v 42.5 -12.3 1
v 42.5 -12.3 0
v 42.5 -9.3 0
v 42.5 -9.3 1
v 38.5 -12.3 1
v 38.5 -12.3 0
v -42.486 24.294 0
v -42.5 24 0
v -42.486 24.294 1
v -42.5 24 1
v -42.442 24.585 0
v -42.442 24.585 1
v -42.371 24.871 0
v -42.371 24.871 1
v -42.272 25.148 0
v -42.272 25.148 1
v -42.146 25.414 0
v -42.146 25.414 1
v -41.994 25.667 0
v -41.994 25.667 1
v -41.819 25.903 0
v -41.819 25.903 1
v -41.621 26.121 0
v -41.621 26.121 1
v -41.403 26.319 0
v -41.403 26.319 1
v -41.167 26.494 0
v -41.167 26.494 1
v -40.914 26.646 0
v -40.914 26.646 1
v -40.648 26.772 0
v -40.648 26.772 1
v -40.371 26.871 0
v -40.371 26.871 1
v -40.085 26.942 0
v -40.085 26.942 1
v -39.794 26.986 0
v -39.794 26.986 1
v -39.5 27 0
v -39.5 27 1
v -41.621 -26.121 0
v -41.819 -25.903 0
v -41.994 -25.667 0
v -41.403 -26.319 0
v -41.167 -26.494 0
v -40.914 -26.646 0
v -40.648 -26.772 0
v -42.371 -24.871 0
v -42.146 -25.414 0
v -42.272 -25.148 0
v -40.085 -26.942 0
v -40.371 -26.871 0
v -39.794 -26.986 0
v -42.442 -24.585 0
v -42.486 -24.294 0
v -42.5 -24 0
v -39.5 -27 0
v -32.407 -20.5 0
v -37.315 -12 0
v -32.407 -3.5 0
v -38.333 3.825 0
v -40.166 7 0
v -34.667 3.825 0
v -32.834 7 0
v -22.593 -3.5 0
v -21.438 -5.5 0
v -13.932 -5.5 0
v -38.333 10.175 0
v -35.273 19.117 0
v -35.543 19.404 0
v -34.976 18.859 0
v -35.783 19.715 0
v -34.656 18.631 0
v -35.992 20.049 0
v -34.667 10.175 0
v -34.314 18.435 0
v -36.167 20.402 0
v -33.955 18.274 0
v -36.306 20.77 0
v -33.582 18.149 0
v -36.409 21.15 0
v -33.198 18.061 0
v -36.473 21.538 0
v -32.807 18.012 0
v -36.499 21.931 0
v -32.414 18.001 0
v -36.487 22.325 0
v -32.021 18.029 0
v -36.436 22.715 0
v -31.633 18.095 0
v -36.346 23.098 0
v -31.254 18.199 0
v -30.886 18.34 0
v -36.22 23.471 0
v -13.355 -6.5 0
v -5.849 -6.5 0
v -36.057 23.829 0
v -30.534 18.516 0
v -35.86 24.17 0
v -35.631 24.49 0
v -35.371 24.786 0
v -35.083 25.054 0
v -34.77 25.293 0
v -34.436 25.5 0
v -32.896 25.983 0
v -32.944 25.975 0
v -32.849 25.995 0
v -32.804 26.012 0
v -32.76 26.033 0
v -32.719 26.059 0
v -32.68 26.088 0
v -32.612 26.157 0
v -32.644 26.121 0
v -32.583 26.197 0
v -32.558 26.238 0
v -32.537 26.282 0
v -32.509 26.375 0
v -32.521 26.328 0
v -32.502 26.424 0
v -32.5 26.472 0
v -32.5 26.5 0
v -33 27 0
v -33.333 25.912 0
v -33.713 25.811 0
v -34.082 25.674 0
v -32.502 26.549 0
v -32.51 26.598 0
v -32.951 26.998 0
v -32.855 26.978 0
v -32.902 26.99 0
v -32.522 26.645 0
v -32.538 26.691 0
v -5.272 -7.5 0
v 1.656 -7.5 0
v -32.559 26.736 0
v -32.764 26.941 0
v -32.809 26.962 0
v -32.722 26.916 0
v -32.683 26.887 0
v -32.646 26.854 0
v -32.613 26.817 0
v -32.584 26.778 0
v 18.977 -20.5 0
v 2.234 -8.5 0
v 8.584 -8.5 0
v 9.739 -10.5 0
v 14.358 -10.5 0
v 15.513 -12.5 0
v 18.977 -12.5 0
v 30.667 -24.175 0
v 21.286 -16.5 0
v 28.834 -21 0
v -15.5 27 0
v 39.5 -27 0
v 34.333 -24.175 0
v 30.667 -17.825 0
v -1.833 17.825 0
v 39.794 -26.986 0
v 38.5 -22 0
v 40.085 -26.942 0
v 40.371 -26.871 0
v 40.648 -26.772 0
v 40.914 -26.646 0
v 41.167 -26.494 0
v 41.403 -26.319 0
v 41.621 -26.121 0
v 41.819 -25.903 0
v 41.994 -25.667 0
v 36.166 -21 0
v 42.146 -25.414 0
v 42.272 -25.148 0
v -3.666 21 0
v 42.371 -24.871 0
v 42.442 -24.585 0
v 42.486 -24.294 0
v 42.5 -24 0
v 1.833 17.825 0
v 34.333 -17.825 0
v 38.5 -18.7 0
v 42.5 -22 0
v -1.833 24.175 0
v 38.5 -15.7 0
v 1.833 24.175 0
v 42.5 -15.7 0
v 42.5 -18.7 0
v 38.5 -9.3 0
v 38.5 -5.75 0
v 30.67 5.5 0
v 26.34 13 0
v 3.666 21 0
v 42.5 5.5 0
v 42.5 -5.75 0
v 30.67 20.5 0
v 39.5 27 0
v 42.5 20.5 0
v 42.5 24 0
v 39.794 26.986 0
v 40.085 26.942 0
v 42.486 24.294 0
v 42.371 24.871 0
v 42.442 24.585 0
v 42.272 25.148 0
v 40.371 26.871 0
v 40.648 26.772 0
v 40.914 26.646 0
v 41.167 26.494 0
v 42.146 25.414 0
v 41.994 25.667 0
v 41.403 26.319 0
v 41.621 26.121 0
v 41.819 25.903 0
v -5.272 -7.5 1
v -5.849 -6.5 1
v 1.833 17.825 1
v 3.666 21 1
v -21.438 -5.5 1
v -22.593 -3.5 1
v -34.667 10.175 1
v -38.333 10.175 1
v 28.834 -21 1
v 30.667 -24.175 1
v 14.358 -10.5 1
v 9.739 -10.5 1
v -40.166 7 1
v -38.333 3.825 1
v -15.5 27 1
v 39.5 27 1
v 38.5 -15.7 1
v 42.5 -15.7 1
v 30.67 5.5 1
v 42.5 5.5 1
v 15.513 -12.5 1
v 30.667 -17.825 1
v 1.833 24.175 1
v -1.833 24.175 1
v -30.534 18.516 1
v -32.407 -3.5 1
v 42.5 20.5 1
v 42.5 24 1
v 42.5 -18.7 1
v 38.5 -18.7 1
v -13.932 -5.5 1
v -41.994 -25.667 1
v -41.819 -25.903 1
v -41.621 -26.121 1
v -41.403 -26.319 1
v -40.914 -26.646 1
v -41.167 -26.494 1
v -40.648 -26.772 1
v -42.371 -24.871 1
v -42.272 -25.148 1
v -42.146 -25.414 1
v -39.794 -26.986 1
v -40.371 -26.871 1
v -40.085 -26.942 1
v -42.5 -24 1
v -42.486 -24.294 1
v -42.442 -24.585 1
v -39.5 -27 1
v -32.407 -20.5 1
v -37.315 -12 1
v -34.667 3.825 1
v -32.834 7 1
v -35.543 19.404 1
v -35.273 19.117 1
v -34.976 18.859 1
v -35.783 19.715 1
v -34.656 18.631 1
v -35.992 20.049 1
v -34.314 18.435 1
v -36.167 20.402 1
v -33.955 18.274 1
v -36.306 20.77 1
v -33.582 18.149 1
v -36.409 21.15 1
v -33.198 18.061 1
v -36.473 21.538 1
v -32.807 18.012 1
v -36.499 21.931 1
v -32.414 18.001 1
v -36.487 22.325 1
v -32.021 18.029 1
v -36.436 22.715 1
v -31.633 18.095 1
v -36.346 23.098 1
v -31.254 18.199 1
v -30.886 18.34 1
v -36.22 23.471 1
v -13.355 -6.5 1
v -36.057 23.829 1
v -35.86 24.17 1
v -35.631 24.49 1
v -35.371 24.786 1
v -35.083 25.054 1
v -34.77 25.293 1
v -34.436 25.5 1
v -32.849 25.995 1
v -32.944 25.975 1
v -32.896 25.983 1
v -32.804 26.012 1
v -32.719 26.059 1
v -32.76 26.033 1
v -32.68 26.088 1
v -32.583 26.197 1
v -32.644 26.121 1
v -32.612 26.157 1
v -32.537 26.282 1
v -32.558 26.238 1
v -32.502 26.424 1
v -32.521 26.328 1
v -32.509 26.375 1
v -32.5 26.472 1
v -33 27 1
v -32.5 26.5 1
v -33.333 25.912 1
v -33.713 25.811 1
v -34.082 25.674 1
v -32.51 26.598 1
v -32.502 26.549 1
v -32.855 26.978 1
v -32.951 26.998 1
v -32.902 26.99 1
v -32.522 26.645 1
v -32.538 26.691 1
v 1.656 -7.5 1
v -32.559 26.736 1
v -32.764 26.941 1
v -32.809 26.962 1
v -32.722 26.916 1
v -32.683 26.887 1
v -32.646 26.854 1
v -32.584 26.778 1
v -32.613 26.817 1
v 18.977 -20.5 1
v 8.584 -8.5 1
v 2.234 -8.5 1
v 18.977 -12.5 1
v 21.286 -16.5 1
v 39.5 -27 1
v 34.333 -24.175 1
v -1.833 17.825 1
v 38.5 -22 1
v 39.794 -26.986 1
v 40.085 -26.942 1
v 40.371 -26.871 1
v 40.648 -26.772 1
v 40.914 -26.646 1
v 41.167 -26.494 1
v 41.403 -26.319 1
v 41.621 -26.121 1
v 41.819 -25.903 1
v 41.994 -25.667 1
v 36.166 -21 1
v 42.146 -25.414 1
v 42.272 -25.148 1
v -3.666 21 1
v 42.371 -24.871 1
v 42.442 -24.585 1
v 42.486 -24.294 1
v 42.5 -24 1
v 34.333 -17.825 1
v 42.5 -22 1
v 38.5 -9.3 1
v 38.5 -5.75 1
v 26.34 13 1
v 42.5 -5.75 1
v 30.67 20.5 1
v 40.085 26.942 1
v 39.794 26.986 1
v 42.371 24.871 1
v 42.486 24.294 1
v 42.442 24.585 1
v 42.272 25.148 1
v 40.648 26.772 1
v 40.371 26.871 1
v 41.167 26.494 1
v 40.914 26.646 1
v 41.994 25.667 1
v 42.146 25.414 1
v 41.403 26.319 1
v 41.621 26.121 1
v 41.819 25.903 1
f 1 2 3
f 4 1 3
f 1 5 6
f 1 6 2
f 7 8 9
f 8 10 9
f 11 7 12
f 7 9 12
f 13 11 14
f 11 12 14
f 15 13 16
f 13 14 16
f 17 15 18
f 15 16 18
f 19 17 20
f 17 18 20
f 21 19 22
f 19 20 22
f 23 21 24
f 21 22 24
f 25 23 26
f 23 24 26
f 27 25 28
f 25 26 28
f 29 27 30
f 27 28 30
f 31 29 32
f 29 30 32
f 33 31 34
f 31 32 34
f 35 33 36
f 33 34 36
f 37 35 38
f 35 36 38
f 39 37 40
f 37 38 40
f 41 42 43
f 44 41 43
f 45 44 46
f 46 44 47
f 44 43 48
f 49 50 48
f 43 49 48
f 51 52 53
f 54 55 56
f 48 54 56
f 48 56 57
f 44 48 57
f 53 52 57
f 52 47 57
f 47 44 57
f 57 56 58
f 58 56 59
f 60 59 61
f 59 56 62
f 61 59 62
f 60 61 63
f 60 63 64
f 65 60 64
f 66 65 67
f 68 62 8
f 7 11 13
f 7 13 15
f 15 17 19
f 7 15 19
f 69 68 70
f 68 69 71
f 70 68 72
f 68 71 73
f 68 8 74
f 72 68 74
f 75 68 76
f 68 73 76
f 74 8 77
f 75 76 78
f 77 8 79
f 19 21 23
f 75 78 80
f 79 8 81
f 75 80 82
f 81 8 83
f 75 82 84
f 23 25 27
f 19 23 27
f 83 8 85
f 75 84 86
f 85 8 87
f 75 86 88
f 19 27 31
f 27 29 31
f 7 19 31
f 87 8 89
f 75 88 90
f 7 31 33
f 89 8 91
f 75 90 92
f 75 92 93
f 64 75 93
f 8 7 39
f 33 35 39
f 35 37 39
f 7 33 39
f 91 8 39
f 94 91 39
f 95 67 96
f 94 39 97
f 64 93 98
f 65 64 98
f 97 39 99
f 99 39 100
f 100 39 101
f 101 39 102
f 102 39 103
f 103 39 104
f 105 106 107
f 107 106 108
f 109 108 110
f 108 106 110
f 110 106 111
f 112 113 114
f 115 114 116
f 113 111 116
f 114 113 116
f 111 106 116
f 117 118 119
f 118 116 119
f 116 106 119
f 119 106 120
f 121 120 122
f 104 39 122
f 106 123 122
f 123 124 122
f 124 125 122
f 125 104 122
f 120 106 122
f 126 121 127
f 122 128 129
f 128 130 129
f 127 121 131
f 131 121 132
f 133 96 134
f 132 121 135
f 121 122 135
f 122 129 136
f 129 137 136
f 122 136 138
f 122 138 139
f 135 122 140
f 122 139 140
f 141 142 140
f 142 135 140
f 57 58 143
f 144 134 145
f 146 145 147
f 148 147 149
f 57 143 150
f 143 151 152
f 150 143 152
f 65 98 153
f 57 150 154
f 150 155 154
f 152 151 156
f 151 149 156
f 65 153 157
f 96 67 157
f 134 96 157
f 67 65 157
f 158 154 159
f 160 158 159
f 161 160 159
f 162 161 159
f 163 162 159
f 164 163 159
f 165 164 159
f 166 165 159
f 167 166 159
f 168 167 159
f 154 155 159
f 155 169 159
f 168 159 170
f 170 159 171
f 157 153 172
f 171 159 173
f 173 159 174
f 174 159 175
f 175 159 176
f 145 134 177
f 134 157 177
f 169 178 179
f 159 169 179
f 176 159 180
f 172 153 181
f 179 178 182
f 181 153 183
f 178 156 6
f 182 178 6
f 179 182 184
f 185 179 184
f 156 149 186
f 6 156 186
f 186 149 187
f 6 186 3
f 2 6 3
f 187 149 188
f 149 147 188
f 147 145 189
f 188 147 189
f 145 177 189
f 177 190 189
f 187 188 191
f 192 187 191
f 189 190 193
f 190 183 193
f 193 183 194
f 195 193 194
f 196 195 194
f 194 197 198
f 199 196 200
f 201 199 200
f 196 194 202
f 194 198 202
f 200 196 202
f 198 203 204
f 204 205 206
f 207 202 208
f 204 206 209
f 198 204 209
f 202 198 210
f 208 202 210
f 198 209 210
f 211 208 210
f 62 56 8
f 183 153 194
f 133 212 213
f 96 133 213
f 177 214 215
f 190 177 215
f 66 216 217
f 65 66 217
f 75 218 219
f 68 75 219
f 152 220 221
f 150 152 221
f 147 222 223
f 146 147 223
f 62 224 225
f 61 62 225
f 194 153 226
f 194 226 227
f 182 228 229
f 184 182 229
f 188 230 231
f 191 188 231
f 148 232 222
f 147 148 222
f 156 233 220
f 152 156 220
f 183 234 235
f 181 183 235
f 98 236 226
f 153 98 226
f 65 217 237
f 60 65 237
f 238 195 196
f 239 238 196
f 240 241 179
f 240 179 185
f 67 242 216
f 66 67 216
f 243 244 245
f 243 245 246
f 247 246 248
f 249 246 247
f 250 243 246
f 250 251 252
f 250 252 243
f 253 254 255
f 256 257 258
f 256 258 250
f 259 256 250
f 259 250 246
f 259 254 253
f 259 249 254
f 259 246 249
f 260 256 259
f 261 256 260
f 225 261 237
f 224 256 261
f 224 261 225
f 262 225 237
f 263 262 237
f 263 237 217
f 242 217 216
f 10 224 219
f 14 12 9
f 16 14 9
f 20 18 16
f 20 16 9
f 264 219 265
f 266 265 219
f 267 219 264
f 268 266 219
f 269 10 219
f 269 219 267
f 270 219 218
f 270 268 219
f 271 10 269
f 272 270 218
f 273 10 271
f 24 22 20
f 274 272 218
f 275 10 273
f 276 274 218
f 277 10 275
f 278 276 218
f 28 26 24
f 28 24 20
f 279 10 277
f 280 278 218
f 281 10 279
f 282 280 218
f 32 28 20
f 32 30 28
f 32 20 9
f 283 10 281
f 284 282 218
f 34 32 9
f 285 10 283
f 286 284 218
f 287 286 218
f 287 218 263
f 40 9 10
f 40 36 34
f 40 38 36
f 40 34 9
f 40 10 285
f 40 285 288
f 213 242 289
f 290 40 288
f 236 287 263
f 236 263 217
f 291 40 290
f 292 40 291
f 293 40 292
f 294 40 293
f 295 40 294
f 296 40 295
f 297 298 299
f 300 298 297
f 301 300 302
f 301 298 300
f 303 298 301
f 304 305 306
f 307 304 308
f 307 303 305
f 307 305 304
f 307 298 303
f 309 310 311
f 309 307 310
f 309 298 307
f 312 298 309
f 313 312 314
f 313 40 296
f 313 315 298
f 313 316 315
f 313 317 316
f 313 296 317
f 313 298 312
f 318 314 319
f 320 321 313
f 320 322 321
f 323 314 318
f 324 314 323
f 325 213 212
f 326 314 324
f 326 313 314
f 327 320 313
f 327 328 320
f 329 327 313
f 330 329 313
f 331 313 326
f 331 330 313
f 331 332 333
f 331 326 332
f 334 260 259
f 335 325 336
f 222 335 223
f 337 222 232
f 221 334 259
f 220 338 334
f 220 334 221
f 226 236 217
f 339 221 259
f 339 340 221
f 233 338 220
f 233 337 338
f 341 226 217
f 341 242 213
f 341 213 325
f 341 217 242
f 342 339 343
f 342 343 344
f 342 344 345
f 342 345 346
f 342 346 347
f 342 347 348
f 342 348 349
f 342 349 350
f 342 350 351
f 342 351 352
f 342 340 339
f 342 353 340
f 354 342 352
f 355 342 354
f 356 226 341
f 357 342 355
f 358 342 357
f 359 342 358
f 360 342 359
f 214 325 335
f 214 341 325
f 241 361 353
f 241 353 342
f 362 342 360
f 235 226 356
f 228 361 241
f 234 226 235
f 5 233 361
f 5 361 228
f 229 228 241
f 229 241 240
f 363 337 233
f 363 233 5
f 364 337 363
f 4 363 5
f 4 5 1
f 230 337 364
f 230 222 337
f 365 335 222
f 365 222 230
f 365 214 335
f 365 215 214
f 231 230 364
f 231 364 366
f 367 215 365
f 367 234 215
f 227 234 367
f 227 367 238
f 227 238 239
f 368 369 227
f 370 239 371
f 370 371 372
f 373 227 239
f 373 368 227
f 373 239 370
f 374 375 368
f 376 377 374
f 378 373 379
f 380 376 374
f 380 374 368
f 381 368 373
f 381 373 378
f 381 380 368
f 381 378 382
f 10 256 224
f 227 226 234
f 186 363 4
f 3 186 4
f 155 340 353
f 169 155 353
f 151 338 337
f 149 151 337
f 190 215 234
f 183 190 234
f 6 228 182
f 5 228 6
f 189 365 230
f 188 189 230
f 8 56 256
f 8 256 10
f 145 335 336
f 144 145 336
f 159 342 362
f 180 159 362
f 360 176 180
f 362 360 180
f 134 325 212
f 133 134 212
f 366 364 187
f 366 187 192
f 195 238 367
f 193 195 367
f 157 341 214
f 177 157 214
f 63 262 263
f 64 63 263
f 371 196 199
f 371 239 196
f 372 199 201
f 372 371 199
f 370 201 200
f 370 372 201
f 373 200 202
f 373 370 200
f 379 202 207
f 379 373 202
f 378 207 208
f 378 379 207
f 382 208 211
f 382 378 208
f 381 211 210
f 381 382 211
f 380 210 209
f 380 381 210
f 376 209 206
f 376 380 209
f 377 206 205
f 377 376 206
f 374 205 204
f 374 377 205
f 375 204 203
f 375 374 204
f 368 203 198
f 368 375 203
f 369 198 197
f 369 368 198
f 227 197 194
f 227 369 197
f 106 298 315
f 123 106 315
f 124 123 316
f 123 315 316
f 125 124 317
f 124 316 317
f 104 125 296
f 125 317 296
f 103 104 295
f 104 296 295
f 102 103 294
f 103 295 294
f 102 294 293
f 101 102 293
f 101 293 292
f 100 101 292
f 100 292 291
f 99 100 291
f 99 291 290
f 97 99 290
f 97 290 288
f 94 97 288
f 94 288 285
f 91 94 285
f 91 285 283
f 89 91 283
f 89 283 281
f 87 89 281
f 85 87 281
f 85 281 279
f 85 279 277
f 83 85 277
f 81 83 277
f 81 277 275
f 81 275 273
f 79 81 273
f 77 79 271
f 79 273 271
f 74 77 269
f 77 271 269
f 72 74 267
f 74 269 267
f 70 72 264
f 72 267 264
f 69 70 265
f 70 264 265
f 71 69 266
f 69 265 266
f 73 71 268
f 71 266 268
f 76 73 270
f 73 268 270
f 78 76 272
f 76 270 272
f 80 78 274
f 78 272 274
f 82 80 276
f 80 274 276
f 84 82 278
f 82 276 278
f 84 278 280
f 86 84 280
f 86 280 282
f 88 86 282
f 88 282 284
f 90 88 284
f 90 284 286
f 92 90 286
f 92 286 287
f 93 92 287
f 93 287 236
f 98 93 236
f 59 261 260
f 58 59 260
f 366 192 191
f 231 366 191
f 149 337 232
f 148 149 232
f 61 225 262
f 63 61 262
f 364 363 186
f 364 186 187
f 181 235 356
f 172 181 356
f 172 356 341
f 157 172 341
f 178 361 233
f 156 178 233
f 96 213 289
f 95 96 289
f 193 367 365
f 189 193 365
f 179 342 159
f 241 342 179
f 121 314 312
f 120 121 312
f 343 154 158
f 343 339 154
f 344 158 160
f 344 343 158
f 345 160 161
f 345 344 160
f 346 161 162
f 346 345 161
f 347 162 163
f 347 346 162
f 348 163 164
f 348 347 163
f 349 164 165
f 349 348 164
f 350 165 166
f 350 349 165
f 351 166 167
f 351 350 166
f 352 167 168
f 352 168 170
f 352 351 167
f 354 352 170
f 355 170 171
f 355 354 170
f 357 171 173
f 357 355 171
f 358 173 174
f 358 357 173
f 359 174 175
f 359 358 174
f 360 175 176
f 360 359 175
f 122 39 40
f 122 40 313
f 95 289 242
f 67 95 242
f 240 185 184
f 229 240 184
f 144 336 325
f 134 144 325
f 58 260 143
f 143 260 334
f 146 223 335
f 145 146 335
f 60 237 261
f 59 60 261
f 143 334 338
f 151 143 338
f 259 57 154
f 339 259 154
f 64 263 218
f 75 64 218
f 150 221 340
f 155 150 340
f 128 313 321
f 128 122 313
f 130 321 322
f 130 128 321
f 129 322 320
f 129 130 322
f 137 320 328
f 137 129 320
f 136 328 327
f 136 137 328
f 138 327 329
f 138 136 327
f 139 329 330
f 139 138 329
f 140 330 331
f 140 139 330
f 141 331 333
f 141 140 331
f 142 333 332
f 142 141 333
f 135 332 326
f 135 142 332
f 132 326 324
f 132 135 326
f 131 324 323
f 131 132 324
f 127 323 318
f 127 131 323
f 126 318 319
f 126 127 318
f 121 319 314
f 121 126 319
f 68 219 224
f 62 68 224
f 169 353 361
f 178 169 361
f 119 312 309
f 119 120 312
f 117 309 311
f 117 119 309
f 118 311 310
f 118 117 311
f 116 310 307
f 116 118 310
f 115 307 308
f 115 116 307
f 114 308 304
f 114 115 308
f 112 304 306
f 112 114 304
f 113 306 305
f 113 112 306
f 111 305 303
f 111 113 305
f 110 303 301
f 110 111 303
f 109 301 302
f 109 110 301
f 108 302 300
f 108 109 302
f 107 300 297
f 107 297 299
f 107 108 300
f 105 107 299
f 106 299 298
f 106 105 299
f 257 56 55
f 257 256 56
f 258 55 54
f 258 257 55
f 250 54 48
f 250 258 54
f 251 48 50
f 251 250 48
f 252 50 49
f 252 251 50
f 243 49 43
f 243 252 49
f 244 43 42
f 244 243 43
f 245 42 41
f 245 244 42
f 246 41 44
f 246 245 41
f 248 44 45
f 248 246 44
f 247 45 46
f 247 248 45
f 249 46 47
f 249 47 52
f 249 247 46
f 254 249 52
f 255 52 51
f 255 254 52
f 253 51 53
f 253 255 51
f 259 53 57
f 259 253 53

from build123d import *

# Parameters (mm, degrees)
F0_W      = 85
F0_H      = 54
F1_DEPTH  = 1
F2_R      = 3
F4_DEPTH  = 1.001
F5_W      = 4
F5_H      = 3.55
F5_H_2    = 3.4
F5_H_3    = 3.3
F6_DEPTH  = 1.001
F8_DEPTH  = 1.001
F10_DEPTH = 1.001
F11_R     = 0.5
F13_DEPTH = 1.001


with BuildPart() as f1:
    # F0 (on Top) → F1 (new body)
    with BuildSketch(Plane.XY):
        Rectangle(F0_W, F0_H)
    extrude(amount=F1_DEPTH)

    # F2
    f2_edges = [f1.edges().sort_by_distance(p)[0] for p in [
        (-42.5, -27, 0.5),
        (-42.5, 27, 0.5),
        (42.5, -27, 0.5),
        (42.5, 27, 0.5),
    ]]
    fillet(f2_edges, radius=F2_R)

    # F3 (on face) → F4 (cut, through all)
    with BuildSketch(Plane.XY.offset(1)):
        Polygon((-22.5925227119, -3.5), (-32.4074772881, -3.5), (-37.3149545762, -12), (-32.4074772881, -20.5), (-22.5925227119, -20.5), (-13.932268674, -20.5), (-5.8493649054, -20.5), (1.6561885941, -20.5), (8.5843918244, -20.5), (14.3578945162, -20.5), (18.9766966698, -20.5), (21.2860977465, -16.5), (18.9766966698, -12.5), (15.5125950546, -12.5), (14.3578945162, -10.5), (9.7390923627, -10.5), (8.5843918244, -8.5), (2.2335388633, -8.5), (1.6561885941, -7.5), (-5.2720146362, -7.5), (-5.8493649054, -6.5), (-13.3549184049, -6.5), (-13.932268674, -5.5), (-21.4378221735, -5.5), align=None)
    extrude(amount=-F4_DEPTH, mode=Mode.SUBTRACT)

    # F5 (on face) → F6 (cut, through all)
    with BuildSketch(Plane.XY.offset(1)):
        with Locations((40.5, -7.525)):
            Rectangle(F5_W, F5_H)
        with Locations((40.5, -14)):
            Rectangle(F5_W, F5_H_2)
        with Locations((40.5, -20.35)):
            Rectangle(F5_W, F5_H_3)
    extrude(amount=-F6_DEPTH, mode=Mode.SUBTRACT)

    # F7 (on face) → F8 (cut, through all)
    with BuildSketch(Plane.XY.offset(1)):
        Polygon((42.5, 20.5), (30.6698729811, 20.5), (26.3397459622, 13), (30.6698729811, 5.5), (42.5, 5.5), align=None)
    extrude(amount=-F8_DEPTH, mode=Mode.SUBTRACT)

    # F9 (on face) → F10 (cut, through all)
    with BuildSketch(Plane.XY.offset(1)):
        with BuildLine():
            Line((-32.5, 27), (-32.5, 26))
            ThreePointArc((-32.5, 26), (-36.3687561178, 20.9837686773), (-30.5342244266, 18.5163630506))
            Line((-30.5342244266, 18.5163630506), (-15.5, 27))
            Line((-15.5, 27), (-32.5, 27))
        make_face()
    extrude(amount=-F10_DEPTH, mode=Mode.SUBTRACT)

    # F11
    f11_edges = [f1.edges().sort_by_distance(p)[0] for p in [
        (-32.5, 26, 0.5),
        (-32.5, 27, 0.5),
    ]]
    fillet(f11_edges, radius=F11_R)

    # F12 (on face) → F13 (cut, through all)
    with BuildSketch(Plane.XY.offset(1)):
        Polygon((1.8330871047, 24.175), (-1.8330871047, 24.175), (-3.6661742094, 21), (-1.8330871047, 17.825), (1.8330871047, 17.825), (3.6661742094, 21), align=None)
        Polygon((34.3330871047, -17.825), (30.6669128953, -17.825), (28.8338257906, -21), (30.6669128953, -24.175), (34.3330871047, -24.175), (36.1661742094, -21), align=None)
        Polygon((-34.6669128953, 10.175), (-38.3330871047, 10.175), (-40.1661742094, 7), (-38.3330871047, 3.825), (-34.6669128953, 3.825), (-32.8338257906, 7), align=None)
    extrude(amount=-F13_DEPTH, mode=Mode.SUBTRACT)


solid = f1.part
